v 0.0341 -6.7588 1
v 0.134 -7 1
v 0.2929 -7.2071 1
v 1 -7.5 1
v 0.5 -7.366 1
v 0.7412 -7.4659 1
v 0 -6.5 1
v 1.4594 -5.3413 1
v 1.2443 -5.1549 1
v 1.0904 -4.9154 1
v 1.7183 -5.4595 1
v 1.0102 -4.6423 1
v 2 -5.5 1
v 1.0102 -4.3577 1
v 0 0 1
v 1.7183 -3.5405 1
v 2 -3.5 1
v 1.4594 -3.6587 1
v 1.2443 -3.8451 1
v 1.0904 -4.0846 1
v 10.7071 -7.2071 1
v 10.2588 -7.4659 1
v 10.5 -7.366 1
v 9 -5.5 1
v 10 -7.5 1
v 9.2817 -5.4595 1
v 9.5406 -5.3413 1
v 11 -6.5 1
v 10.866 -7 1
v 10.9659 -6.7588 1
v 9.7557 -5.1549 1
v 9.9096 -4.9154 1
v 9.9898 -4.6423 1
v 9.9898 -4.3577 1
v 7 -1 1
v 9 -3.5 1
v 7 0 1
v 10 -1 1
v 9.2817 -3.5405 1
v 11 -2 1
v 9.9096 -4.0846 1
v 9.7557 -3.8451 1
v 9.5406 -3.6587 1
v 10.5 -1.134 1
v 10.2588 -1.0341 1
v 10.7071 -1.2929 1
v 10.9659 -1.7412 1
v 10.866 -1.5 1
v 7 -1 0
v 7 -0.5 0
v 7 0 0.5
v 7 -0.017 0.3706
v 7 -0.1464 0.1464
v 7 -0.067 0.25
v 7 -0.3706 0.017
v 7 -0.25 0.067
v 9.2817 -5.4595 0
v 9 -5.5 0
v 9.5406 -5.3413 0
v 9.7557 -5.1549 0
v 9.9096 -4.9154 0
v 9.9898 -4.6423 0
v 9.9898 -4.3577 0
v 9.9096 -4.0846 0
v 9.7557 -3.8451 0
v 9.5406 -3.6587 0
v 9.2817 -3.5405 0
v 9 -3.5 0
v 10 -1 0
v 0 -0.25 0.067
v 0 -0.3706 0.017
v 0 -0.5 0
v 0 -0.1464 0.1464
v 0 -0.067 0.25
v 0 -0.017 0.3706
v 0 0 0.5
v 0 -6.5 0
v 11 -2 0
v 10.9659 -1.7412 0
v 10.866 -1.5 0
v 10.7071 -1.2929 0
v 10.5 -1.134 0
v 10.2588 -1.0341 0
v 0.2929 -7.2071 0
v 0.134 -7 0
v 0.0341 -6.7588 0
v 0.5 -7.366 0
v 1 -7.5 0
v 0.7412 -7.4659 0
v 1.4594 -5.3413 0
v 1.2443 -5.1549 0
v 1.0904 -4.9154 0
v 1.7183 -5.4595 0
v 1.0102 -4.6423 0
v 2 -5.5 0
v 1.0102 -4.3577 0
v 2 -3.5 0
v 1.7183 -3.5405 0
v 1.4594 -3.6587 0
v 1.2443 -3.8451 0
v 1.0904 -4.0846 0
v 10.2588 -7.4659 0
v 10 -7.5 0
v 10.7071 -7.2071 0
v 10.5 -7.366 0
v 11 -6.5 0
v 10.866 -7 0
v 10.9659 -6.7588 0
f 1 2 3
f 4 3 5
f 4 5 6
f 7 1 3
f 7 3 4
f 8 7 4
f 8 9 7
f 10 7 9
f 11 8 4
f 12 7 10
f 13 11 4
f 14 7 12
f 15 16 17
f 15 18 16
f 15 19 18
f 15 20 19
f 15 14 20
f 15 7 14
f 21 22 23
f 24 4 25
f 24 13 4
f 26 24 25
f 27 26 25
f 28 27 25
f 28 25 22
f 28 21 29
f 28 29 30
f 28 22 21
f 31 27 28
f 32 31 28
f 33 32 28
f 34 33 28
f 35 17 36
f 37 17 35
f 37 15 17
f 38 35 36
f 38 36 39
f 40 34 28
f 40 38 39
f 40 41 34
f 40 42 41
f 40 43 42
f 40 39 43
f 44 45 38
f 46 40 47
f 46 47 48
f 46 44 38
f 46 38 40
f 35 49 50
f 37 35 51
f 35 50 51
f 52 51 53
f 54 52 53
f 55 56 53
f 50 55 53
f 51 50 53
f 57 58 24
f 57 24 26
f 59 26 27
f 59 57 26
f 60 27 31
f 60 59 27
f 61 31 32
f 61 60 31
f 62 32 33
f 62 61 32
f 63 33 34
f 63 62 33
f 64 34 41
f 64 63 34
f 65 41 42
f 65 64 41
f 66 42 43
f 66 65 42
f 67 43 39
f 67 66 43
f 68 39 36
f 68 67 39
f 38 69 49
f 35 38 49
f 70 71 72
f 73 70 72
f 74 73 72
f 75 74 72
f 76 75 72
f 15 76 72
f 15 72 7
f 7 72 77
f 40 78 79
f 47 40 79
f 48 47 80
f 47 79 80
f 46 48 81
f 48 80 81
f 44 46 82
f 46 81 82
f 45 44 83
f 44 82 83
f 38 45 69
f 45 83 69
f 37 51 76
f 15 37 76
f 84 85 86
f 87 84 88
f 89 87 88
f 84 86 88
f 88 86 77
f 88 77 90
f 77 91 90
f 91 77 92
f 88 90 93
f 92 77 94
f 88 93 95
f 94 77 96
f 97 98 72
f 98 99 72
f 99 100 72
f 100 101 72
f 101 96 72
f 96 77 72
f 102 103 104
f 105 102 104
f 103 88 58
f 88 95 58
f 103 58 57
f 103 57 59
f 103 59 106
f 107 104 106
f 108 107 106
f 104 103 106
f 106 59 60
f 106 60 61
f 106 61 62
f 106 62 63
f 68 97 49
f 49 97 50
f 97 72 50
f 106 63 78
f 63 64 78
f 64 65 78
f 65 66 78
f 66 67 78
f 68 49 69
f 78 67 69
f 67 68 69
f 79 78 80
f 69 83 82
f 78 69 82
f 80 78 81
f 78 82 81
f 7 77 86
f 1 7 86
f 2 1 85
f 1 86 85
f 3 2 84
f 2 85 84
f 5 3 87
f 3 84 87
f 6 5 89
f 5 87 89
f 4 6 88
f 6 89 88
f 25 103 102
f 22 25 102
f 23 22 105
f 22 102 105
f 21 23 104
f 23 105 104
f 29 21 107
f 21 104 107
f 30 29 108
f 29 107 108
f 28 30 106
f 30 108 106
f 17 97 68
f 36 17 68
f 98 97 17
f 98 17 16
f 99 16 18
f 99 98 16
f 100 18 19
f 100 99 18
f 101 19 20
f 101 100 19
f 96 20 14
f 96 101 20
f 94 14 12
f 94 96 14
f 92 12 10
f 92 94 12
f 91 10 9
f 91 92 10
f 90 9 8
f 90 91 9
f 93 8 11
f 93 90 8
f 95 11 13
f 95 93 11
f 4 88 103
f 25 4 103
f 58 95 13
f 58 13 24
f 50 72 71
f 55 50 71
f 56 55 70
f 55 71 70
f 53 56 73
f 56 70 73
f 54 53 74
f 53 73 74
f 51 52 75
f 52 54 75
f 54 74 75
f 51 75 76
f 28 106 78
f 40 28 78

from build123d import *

# Parameters (mm, degrees)
EXTRUDE074_DEPTH = 1
EXTRUDE075_DEPTH = 15
EXTRUDE073_DEPTH = 1


with BuildPart() as extrude074:
    # Sketch271 → Extrude074 (new body)
    with BuildSketch(Plane.XY):
        with BuildLine():
            Line((2, -5.5), (9, -5.5))
            ThreePointArc((9, -5.5), (10, -4.5), (9, -3.5))
            Line((2, -3.5), (9, -3.5))
            ThreePointArc((2, -3.5), (1, -4.5), (2, -5.5))
        make_face()
    extrude(amount=EXTRUDE074_DEPTH)


with BuildPart() as extrude075:
    # Sketch272 → Extrude075 (new body)
    with BuildSketch(Plane.YZ):
        with BuildLine():
            ThreePointArc((-0.5, 0), (-0.146447, 0.146447), (0, 0.5))
            Line((0, 0.5), (0, 0))
            Line((-0.5, 0), (0, 0))
        make_face()
    extrude(amount=EXTRUDE075_DEPTH)


with BuildPart() as cut045:
    # Sketch270 → Extrude073 (new body)
    with BuildSketch(Plane(origin=(0, -0.5, 0), x_dir=(1, 0, 0), z_dir=(0, 0, 1))):
        with BuildLine():
            ThreePointArc((0, -6), (0.292893, -6.707107), (1, -7))
            Line((1, -7), (10, -7))
            ThreePointArc((10, -7), (10.707107, -6.707106), (11, -6))
            Line((11, -6), (11, -1.5))
            ThreePointArc((11, -1.5), (10.707107, -0.792893), (10, -0.5))
            Line((10, -0.5), (7, -0.5))
            Line((7, -0.5), (7, 0.5))
            Line((7, 0.5), (0, 0.5))
            Line((0, 0.5), (0, -6))
        make_face()
    extrude(amount=EXTRUDE073_DEPTH)

    # Cut044: cut Extrude075
    add(extrude075.part, mode=Mode.SUBTRACT)

    # Cut045: cut Extrude074
    add(extrude074.part, mode=Mode.SUBTRACT)


solid = cut045.part
